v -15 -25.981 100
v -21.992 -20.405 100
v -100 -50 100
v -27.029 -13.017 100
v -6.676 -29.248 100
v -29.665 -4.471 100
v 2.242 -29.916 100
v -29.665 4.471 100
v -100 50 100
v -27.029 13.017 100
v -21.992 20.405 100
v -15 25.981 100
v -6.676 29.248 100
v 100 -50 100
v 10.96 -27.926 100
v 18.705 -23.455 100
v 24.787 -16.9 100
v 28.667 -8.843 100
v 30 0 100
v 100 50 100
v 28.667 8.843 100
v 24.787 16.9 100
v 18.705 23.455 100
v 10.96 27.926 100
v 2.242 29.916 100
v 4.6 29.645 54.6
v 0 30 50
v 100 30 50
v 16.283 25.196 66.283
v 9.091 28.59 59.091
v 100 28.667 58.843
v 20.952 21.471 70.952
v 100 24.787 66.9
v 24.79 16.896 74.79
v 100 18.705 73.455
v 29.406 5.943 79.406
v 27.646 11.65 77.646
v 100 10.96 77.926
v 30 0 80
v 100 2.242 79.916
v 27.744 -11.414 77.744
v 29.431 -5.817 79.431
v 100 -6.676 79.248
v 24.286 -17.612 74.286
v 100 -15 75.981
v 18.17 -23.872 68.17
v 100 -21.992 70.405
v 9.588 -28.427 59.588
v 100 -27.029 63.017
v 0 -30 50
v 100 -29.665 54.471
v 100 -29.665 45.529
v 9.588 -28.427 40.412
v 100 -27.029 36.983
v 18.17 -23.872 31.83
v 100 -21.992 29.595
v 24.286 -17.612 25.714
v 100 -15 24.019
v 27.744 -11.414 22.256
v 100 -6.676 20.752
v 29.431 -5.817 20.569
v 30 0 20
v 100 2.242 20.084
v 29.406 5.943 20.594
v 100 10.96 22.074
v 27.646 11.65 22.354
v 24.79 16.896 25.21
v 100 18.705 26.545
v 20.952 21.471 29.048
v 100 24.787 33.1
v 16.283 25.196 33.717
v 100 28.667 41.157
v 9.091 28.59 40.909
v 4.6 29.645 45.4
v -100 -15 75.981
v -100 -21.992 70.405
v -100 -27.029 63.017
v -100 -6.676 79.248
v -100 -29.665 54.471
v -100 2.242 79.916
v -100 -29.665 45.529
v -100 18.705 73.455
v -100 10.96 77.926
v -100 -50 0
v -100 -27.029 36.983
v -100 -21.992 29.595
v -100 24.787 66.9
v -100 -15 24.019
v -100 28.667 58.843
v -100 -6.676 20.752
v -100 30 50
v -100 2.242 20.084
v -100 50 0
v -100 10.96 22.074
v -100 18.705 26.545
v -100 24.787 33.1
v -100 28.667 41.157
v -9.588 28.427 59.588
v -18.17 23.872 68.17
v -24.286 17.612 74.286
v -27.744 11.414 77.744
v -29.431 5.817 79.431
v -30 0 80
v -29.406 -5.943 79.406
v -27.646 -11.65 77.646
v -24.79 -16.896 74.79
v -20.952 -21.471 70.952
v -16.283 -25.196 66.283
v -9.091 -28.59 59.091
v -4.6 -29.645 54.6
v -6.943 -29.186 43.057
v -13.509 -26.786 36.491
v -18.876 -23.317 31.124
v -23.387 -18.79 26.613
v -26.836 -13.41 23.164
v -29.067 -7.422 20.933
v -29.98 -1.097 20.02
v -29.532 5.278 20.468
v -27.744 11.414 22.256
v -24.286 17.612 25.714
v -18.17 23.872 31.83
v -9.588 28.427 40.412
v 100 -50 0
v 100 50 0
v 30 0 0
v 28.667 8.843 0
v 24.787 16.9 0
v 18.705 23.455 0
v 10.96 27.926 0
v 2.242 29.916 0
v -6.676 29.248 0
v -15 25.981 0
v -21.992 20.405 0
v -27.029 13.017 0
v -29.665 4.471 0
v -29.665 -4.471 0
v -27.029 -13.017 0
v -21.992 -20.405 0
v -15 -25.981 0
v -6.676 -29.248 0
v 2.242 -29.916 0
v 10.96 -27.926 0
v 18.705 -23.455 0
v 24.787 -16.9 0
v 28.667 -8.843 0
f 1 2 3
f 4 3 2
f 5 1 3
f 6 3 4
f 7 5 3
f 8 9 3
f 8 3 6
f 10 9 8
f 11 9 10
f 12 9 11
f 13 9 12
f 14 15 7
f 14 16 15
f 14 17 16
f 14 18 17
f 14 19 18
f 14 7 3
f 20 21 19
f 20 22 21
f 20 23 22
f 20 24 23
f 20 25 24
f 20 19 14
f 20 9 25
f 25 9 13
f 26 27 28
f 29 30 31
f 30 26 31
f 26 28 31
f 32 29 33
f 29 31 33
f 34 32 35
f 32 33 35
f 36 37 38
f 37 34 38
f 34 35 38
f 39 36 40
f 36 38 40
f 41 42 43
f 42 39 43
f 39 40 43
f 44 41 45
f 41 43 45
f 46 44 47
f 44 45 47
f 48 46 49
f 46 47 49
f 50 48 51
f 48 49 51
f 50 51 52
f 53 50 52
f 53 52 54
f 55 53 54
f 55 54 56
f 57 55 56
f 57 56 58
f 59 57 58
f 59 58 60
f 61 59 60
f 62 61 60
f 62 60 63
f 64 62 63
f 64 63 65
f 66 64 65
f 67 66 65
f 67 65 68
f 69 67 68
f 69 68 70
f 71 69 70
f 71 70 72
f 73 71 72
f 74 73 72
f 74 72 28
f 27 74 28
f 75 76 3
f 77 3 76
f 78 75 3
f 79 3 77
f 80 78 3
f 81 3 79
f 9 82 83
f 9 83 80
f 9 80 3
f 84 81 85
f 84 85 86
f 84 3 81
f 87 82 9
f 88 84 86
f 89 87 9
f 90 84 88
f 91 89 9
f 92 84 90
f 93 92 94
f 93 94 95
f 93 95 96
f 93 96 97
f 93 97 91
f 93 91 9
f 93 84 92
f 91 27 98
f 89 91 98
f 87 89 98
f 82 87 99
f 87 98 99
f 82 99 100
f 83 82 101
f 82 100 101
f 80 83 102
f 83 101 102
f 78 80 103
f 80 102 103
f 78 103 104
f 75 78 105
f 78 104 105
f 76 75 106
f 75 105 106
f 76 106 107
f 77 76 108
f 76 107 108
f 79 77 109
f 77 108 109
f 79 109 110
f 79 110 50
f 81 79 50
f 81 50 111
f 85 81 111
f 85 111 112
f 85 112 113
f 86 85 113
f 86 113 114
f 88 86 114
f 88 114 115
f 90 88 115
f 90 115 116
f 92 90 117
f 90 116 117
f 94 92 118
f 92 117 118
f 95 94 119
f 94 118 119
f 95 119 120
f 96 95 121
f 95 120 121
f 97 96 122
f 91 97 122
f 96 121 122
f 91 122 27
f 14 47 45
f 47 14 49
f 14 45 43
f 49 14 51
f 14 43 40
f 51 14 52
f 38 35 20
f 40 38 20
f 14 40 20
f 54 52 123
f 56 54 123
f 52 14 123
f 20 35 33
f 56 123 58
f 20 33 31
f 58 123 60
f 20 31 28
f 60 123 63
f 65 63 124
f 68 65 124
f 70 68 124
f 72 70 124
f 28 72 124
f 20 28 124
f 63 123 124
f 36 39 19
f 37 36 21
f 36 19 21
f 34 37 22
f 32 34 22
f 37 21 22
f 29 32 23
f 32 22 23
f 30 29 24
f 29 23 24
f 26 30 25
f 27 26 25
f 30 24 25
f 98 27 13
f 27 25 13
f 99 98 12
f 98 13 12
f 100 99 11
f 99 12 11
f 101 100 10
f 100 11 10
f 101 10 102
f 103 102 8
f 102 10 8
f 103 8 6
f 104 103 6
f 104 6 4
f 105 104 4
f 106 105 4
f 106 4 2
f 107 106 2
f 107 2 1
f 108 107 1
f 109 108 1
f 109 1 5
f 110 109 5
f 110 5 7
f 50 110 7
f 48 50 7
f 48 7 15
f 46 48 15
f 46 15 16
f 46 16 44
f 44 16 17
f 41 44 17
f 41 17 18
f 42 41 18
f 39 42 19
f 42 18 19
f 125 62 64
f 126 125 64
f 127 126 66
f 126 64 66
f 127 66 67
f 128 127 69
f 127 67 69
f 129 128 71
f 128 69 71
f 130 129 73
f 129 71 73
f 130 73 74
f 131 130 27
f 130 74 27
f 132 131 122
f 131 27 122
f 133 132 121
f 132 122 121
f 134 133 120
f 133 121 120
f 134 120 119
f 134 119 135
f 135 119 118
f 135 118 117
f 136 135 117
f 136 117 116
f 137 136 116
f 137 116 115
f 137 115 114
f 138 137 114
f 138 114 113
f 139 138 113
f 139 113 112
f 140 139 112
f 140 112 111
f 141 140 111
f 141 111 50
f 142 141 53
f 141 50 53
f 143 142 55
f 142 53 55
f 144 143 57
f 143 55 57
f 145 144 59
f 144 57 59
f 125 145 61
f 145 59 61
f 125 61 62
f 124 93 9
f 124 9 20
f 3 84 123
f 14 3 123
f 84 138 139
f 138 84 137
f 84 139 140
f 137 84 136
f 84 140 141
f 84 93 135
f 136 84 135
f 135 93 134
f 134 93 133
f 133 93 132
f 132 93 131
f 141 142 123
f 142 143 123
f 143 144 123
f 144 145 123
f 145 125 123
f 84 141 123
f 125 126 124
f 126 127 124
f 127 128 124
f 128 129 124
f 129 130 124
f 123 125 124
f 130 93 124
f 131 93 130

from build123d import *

# Parameters (mm, degrees)
F0_W     = 200
F0_H     = 100
F1_DEPTH = 100
F2_R     = 30
F3_DEPTH = 100
F4_R     = 30
F5_DEPTH = 200.001


with BuildPart() as f1:
    # F0 (on Top) → F1 (new body)
    with BuildSketch(Plane.XY):
        Rectangle(F0_W, F0_H)
    extrude(amount=F1_DEPTH)

    # F2 (on face) → F3 (cut, through all)
    with BuildSketch(Plane.XY.offset(100)):
        Circle(F2_R)
    extrude(amount=-F3_DEPTH, mode=Mode.SUBTRACT)

    # F4 (on face) → F5 (cut, through all)
    with BuildSketch(Plane.YZ.offset(100)):
        with Locations((0, 50)):
            Circle(F4_R)
    extrude(amount=-F5_DEPTH, mode=Mode.SUBTRACT)


solid = f1.part
